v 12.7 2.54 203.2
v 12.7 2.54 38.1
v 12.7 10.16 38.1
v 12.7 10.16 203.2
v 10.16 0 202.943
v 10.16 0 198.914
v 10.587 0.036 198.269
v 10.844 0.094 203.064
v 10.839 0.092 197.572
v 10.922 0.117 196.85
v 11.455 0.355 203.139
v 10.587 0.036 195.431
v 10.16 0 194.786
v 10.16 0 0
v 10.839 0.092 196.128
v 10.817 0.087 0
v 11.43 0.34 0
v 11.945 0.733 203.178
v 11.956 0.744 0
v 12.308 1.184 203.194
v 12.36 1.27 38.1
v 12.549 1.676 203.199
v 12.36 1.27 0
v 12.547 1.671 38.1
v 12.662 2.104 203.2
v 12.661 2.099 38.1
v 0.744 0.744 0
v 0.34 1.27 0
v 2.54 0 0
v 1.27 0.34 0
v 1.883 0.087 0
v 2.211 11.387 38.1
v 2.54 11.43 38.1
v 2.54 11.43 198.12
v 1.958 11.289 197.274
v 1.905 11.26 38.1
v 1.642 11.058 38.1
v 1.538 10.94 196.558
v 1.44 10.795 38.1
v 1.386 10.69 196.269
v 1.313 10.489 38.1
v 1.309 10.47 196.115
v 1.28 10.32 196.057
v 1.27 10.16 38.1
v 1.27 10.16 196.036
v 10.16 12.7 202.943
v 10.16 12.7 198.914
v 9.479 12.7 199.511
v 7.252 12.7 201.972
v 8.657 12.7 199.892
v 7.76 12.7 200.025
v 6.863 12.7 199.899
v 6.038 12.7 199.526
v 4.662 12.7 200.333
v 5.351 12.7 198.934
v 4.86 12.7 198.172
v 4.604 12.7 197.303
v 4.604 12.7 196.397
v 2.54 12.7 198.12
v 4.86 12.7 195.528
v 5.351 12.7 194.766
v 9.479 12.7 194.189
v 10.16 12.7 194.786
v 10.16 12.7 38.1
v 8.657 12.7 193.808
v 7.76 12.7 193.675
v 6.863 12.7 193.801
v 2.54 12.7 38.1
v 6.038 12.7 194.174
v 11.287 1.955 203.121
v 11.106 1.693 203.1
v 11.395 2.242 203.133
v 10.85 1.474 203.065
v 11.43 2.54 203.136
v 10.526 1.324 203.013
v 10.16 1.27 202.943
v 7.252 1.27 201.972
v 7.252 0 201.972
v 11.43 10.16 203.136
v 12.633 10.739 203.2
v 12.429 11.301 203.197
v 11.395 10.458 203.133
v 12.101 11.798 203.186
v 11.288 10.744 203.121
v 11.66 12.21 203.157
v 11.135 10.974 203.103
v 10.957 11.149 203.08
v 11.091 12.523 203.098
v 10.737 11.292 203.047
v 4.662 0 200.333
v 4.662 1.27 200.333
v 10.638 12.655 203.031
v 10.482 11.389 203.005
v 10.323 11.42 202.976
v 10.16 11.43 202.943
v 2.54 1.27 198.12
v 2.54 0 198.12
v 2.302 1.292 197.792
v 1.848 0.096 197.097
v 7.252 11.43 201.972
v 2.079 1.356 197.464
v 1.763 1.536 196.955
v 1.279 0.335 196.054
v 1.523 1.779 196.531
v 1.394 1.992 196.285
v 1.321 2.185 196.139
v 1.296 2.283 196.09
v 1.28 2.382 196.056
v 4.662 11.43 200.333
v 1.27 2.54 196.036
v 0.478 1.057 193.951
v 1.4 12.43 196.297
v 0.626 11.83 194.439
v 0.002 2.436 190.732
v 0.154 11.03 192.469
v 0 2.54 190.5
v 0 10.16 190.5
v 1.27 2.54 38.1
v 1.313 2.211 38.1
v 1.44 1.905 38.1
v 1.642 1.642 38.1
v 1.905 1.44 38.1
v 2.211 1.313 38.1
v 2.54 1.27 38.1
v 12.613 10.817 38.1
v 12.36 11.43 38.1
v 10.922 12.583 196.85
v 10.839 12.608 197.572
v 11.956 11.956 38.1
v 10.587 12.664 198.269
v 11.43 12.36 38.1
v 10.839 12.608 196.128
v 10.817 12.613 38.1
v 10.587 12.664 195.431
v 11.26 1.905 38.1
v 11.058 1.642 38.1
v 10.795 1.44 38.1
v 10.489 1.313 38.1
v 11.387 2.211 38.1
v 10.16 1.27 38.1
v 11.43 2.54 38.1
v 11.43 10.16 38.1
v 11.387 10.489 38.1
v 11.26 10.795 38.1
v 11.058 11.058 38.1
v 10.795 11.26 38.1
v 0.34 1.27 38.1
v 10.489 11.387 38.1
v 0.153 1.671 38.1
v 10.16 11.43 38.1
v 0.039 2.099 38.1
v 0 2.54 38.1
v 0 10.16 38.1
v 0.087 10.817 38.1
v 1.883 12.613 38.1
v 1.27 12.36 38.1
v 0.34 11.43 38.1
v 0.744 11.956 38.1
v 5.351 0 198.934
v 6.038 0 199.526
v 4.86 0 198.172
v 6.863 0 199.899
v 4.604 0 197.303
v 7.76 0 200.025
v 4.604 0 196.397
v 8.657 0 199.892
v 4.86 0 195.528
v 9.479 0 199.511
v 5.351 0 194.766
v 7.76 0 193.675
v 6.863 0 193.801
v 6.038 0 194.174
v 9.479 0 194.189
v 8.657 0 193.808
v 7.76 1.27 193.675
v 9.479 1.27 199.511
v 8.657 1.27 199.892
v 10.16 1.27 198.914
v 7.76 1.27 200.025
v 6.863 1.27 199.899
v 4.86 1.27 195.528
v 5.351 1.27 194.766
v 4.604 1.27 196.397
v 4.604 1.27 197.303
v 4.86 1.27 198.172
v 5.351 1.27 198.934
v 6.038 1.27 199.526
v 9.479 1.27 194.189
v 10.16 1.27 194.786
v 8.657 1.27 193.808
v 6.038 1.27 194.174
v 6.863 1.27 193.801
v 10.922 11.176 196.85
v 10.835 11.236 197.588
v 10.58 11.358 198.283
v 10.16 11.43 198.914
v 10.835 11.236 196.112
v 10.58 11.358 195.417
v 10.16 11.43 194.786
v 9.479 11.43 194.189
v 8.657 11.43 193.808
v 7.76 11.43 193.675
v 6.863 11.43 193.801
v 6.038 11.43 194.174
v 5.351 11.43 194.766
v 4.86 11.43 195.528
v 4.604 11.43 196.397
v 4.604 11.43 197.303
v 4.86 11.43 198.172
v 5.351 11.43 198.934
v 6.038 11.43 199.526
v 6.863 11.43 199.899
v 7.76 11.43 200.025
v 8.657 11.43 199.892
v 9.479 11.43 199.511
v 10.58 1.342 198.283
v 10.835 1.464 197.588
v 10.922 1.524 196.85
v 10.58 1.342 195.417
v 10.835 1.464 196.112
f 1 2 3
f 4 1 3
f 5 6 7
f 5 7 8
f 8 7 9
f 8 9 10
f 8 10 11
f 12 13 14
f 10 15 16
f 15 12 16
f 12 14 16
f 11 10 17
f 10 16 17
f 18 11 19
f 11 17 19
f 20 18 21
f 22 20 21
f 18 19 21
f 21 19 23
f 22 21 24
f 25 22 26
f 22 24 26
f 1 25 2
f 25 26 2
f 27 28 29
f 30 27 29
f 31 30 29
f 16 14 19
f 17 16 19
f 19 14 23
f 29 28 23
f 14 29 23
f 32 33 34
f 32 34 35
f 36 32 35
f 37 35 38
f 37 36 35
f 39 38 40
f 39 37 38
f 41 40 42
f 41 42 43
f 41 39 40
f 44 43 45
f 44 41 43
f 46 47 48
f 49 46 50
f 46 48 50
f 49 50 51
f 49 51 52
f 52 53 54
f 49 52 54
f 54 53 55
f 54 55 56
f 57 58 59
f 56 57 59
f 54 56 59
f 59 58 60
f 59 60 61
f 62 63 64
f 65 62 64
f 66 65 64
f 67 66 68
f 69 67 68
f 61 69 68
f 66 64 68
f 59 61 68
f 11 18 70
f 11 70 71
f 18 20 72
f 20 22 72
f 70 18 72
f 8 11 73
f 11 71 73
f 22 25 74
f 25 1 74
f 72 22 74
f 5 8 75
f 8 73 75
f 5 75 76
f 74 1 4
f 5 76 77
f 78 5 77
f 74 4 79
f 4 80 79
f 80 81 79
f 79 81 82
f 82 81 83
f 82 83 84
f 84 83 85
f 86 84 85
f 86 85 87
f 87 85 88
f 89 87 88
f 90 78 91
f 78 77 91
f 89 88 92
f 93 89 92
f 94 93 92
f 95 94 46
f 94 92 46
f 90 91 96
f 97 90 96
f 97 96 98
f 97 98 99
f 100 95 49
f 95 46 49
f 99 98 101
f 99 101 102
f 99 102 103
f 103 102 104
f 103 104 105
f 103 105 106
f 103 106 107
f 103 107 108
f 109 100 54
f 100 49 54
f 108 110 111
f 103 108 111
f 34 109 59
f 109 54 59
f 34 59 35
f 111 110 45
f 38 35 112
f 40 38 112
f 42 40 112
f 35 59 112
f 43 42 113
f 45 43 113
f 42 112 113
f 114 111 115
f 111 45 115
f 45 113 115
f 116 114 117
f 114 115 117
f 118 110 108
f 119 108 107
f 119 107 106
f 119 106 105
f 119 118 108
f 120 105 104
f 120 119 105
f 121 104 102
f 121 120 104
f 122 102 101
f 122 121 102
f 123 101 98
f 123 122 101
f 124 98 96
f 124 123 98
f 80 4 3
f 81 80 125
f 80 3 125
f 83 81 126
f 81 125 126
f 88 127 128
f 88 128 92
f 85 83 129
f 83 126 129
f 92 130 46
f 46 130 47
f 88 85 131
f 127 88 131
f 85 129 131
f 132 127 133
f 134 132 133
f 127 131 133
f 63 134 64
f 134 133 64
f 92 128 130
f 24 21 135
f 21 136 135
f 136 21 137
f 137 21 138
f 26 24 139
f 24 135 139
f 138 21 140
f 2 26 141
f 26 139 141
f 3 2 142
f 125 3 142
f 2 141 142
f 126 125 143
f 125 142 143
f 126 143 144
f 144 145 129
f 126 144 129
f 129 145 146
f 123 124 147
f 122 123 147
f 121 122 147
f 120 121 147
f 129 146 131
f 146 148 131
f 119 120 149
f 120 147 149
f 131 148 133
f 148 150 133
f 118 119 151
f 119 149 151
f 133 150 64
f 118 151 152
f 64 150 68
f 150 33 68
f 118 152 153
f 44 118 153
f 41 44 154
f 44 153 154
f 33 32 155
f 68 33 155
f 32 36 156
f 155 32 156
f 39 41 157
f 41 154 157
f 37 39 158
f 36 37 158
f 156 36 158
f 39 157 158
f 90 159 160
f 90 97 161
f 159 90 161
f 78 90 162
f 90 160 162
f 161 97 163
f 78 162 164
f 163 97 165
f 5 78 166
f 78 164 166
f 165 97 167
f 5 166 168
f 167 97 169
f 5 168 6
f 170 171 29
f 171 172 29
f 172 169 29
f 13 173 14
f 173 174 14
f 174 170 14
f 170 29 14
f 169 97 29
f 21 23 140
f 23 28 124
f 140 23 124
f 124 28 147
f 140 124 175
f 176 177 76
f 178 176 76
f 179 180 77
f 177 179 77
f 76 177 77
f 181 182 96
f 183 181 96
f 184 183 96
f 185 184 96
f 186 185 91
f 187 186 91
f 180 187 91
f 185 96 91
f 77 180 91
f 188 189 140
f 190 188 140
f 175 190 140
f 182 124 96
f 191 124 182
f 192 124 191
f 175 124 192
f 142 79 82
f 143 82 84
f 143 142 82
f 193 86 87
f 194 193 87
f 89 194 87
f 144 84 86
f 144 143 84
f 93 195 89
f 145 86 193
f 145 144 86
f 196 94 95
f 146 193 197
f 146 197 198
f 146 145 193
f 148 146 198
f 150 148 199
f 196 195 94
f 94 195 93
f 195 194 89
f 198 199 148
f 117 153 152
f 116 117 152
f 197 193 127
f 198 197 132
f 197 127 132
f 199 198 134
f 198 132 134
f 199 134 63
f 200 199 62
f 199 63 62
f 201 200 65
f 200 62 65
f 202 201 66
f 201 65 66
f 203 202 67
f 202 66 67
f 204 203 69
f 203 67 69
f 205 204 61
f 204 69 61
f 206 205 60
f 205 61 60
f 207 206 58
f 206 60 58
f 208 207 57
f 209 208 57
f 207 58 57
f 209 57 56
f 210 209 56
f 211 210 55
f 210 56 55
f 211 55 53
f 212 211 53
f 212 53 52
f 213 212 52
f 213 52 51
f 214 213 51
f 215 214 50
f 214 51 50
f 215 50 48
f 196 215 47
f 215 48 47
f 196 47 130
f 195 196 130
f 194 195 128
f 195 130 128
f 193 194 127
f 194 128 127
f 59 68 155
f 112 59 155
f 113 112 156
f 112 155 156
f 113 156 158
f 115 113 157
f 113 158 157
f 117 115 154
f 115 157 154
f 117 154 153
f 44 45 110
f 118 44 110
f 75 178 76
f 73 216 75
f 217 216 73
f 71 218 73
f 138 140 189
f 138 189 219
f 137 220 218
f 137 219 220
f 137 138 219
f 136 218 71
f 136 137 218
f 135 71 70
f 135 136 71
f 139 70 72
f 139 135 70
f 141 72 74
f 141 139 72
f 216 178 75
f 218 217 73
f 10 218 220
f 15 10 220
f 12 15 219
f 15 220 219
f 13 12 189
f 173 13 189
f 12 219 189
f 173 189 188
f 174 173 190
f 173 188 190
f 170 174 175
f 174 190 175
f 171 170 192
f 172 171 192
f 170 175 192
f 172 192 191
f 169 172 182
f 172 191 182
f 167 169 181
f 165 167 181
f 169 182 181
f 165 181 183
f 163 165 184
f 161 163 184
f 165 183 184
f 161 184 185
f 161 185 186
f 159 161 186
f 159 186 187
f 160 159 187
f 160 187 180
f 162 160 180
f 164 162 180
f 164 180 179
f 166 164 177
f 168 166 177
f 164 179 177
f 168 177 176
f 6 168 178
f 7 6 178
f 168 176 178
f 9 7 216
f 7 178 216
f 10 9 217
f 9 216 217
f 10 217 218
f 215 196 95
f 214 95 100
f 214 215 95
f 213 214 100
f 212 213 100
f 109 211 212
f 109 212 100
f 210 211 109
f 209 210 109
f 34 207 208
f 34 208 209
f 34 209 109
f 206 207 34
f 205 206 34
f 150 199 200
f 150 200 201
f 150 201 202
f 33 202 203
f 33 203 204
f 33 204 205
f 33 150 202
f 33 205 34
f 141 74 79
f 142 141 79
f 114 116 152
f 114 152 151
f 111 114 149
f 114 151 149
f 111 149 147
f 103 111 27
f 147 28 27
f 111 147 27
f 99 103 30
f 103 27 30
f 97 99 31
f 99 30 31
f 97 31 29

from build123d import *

# Parameters (mm, degrees)
BOSS_EXTRUDE1_DEPTH = 203.2
SKETCH2_R           = 3.175
CUT_EXTRUDE1_DEPTH  = 13.7
SKETCH3_W           = 38.1
SKETCH3_H           = 11.43
CUT_EXTRUDE2_DEPTH  = 13.7000001
CUT_EXTRUDE3_DEPTH  = 13.7000001


with BuildPart() as part:
    # Sketch1 → Boss-Extrude1 (new body)
    with BuildSketch(Plane.XY):
        with BuildLine():
            Line((2.54, 0), (10.16, 0))
            ThreePointArc((10.16, 0), (11.956051224, 0.743948776), (12.7, 2.54))
            Line((12.7, 2.54), (12.7, 10.16))
            ThreePointArc((12.7, 10.16), (11.956051224, 11.956051224), (10.16, 12.7))
            Line((10.16, 12.7), (2.54, 12.7))
            ThreePointArc((2.54, 12.7), (0.743948776, 11.956051224), (0, 10.16))
            Line((0, 10.16), (0, 2.54))
            ThreePointArc((0, 2.54), (0.743948776, 0.743948776), (2.54, 0))
        make_face()
        with BuildLine():
            Line((2.54, 1.27), (10.16, 1.27))
            ThreePointArc((10.16, 1.27), (11.058025612, 1.641974388), (11.43, 2.54))
            Line((11.43, 2.54), (11.43, 10.16))
            ThreePointArc((11.43, 10.16), (11.058025612, 11.058025612), (10.16, 11.43))
            Line((10.16, 11.43), (2.54, 11.43))
            ThreePointArc((2.54, 11.43), (1.641974388, 11.058025612), (1.27, 10.16))
            Line((1.27, 10.16), (1.27, 2.54))
            ThreePointArc((1.27, 2.54), (1.641974388, 1.641974388), (2.54, 1.27))
        make_face(mode=Mode.SUBTRACT)
    extrude(amount=BOSS_EXTRUDE1_DEPTH)

    # Sketch2 → Cut-Extrude1 (cut, through all)
    with BuildSketch(Plane(origin=(0, 12.7, 0), x_dir=(1, 0, 0), z_dir=(0, 1, 0))):
        with Locations((7.747, -196.85)):
            Circle(SKETCH2_R)
    extrude(amount=-CUT_EXTRUDE1_DEPTH, mode=Mode.SUBTRACT)

    # Sketch3 → Cut-Extrude2 (cut, through all)
    with BuildSketch(Plane.ZY):
        with Locations((19.05, 6.985)):
            Rectangle(SKETCH3_W, SKETCH3_H)
    extrude(amount=-CUT_EXTRUDE2_DEPTH, mode=Mode.SUBTRACT)

    # Sketch4 → Cut-Extrude3 (cut, through all)
    with BuildSketch(Plane(origin=(0, 12.7, 0), x_dir=(1, 0, 0), z_dir=(0, 1, 0))):
        with BuildLine():
            Line((0, -203.2), (12.7, -203.2))
            ThreePointArc((12.7, -203.2), (3.719743879, -199.480256121), (0, -190.5))
            Line((0, -190.5), (0, -203.2))
        make_face()
    extrude(amount=-CUT_EXTRUDE3_DEPTH, mode=Mode.SUBTRACT)


solid = part.part
